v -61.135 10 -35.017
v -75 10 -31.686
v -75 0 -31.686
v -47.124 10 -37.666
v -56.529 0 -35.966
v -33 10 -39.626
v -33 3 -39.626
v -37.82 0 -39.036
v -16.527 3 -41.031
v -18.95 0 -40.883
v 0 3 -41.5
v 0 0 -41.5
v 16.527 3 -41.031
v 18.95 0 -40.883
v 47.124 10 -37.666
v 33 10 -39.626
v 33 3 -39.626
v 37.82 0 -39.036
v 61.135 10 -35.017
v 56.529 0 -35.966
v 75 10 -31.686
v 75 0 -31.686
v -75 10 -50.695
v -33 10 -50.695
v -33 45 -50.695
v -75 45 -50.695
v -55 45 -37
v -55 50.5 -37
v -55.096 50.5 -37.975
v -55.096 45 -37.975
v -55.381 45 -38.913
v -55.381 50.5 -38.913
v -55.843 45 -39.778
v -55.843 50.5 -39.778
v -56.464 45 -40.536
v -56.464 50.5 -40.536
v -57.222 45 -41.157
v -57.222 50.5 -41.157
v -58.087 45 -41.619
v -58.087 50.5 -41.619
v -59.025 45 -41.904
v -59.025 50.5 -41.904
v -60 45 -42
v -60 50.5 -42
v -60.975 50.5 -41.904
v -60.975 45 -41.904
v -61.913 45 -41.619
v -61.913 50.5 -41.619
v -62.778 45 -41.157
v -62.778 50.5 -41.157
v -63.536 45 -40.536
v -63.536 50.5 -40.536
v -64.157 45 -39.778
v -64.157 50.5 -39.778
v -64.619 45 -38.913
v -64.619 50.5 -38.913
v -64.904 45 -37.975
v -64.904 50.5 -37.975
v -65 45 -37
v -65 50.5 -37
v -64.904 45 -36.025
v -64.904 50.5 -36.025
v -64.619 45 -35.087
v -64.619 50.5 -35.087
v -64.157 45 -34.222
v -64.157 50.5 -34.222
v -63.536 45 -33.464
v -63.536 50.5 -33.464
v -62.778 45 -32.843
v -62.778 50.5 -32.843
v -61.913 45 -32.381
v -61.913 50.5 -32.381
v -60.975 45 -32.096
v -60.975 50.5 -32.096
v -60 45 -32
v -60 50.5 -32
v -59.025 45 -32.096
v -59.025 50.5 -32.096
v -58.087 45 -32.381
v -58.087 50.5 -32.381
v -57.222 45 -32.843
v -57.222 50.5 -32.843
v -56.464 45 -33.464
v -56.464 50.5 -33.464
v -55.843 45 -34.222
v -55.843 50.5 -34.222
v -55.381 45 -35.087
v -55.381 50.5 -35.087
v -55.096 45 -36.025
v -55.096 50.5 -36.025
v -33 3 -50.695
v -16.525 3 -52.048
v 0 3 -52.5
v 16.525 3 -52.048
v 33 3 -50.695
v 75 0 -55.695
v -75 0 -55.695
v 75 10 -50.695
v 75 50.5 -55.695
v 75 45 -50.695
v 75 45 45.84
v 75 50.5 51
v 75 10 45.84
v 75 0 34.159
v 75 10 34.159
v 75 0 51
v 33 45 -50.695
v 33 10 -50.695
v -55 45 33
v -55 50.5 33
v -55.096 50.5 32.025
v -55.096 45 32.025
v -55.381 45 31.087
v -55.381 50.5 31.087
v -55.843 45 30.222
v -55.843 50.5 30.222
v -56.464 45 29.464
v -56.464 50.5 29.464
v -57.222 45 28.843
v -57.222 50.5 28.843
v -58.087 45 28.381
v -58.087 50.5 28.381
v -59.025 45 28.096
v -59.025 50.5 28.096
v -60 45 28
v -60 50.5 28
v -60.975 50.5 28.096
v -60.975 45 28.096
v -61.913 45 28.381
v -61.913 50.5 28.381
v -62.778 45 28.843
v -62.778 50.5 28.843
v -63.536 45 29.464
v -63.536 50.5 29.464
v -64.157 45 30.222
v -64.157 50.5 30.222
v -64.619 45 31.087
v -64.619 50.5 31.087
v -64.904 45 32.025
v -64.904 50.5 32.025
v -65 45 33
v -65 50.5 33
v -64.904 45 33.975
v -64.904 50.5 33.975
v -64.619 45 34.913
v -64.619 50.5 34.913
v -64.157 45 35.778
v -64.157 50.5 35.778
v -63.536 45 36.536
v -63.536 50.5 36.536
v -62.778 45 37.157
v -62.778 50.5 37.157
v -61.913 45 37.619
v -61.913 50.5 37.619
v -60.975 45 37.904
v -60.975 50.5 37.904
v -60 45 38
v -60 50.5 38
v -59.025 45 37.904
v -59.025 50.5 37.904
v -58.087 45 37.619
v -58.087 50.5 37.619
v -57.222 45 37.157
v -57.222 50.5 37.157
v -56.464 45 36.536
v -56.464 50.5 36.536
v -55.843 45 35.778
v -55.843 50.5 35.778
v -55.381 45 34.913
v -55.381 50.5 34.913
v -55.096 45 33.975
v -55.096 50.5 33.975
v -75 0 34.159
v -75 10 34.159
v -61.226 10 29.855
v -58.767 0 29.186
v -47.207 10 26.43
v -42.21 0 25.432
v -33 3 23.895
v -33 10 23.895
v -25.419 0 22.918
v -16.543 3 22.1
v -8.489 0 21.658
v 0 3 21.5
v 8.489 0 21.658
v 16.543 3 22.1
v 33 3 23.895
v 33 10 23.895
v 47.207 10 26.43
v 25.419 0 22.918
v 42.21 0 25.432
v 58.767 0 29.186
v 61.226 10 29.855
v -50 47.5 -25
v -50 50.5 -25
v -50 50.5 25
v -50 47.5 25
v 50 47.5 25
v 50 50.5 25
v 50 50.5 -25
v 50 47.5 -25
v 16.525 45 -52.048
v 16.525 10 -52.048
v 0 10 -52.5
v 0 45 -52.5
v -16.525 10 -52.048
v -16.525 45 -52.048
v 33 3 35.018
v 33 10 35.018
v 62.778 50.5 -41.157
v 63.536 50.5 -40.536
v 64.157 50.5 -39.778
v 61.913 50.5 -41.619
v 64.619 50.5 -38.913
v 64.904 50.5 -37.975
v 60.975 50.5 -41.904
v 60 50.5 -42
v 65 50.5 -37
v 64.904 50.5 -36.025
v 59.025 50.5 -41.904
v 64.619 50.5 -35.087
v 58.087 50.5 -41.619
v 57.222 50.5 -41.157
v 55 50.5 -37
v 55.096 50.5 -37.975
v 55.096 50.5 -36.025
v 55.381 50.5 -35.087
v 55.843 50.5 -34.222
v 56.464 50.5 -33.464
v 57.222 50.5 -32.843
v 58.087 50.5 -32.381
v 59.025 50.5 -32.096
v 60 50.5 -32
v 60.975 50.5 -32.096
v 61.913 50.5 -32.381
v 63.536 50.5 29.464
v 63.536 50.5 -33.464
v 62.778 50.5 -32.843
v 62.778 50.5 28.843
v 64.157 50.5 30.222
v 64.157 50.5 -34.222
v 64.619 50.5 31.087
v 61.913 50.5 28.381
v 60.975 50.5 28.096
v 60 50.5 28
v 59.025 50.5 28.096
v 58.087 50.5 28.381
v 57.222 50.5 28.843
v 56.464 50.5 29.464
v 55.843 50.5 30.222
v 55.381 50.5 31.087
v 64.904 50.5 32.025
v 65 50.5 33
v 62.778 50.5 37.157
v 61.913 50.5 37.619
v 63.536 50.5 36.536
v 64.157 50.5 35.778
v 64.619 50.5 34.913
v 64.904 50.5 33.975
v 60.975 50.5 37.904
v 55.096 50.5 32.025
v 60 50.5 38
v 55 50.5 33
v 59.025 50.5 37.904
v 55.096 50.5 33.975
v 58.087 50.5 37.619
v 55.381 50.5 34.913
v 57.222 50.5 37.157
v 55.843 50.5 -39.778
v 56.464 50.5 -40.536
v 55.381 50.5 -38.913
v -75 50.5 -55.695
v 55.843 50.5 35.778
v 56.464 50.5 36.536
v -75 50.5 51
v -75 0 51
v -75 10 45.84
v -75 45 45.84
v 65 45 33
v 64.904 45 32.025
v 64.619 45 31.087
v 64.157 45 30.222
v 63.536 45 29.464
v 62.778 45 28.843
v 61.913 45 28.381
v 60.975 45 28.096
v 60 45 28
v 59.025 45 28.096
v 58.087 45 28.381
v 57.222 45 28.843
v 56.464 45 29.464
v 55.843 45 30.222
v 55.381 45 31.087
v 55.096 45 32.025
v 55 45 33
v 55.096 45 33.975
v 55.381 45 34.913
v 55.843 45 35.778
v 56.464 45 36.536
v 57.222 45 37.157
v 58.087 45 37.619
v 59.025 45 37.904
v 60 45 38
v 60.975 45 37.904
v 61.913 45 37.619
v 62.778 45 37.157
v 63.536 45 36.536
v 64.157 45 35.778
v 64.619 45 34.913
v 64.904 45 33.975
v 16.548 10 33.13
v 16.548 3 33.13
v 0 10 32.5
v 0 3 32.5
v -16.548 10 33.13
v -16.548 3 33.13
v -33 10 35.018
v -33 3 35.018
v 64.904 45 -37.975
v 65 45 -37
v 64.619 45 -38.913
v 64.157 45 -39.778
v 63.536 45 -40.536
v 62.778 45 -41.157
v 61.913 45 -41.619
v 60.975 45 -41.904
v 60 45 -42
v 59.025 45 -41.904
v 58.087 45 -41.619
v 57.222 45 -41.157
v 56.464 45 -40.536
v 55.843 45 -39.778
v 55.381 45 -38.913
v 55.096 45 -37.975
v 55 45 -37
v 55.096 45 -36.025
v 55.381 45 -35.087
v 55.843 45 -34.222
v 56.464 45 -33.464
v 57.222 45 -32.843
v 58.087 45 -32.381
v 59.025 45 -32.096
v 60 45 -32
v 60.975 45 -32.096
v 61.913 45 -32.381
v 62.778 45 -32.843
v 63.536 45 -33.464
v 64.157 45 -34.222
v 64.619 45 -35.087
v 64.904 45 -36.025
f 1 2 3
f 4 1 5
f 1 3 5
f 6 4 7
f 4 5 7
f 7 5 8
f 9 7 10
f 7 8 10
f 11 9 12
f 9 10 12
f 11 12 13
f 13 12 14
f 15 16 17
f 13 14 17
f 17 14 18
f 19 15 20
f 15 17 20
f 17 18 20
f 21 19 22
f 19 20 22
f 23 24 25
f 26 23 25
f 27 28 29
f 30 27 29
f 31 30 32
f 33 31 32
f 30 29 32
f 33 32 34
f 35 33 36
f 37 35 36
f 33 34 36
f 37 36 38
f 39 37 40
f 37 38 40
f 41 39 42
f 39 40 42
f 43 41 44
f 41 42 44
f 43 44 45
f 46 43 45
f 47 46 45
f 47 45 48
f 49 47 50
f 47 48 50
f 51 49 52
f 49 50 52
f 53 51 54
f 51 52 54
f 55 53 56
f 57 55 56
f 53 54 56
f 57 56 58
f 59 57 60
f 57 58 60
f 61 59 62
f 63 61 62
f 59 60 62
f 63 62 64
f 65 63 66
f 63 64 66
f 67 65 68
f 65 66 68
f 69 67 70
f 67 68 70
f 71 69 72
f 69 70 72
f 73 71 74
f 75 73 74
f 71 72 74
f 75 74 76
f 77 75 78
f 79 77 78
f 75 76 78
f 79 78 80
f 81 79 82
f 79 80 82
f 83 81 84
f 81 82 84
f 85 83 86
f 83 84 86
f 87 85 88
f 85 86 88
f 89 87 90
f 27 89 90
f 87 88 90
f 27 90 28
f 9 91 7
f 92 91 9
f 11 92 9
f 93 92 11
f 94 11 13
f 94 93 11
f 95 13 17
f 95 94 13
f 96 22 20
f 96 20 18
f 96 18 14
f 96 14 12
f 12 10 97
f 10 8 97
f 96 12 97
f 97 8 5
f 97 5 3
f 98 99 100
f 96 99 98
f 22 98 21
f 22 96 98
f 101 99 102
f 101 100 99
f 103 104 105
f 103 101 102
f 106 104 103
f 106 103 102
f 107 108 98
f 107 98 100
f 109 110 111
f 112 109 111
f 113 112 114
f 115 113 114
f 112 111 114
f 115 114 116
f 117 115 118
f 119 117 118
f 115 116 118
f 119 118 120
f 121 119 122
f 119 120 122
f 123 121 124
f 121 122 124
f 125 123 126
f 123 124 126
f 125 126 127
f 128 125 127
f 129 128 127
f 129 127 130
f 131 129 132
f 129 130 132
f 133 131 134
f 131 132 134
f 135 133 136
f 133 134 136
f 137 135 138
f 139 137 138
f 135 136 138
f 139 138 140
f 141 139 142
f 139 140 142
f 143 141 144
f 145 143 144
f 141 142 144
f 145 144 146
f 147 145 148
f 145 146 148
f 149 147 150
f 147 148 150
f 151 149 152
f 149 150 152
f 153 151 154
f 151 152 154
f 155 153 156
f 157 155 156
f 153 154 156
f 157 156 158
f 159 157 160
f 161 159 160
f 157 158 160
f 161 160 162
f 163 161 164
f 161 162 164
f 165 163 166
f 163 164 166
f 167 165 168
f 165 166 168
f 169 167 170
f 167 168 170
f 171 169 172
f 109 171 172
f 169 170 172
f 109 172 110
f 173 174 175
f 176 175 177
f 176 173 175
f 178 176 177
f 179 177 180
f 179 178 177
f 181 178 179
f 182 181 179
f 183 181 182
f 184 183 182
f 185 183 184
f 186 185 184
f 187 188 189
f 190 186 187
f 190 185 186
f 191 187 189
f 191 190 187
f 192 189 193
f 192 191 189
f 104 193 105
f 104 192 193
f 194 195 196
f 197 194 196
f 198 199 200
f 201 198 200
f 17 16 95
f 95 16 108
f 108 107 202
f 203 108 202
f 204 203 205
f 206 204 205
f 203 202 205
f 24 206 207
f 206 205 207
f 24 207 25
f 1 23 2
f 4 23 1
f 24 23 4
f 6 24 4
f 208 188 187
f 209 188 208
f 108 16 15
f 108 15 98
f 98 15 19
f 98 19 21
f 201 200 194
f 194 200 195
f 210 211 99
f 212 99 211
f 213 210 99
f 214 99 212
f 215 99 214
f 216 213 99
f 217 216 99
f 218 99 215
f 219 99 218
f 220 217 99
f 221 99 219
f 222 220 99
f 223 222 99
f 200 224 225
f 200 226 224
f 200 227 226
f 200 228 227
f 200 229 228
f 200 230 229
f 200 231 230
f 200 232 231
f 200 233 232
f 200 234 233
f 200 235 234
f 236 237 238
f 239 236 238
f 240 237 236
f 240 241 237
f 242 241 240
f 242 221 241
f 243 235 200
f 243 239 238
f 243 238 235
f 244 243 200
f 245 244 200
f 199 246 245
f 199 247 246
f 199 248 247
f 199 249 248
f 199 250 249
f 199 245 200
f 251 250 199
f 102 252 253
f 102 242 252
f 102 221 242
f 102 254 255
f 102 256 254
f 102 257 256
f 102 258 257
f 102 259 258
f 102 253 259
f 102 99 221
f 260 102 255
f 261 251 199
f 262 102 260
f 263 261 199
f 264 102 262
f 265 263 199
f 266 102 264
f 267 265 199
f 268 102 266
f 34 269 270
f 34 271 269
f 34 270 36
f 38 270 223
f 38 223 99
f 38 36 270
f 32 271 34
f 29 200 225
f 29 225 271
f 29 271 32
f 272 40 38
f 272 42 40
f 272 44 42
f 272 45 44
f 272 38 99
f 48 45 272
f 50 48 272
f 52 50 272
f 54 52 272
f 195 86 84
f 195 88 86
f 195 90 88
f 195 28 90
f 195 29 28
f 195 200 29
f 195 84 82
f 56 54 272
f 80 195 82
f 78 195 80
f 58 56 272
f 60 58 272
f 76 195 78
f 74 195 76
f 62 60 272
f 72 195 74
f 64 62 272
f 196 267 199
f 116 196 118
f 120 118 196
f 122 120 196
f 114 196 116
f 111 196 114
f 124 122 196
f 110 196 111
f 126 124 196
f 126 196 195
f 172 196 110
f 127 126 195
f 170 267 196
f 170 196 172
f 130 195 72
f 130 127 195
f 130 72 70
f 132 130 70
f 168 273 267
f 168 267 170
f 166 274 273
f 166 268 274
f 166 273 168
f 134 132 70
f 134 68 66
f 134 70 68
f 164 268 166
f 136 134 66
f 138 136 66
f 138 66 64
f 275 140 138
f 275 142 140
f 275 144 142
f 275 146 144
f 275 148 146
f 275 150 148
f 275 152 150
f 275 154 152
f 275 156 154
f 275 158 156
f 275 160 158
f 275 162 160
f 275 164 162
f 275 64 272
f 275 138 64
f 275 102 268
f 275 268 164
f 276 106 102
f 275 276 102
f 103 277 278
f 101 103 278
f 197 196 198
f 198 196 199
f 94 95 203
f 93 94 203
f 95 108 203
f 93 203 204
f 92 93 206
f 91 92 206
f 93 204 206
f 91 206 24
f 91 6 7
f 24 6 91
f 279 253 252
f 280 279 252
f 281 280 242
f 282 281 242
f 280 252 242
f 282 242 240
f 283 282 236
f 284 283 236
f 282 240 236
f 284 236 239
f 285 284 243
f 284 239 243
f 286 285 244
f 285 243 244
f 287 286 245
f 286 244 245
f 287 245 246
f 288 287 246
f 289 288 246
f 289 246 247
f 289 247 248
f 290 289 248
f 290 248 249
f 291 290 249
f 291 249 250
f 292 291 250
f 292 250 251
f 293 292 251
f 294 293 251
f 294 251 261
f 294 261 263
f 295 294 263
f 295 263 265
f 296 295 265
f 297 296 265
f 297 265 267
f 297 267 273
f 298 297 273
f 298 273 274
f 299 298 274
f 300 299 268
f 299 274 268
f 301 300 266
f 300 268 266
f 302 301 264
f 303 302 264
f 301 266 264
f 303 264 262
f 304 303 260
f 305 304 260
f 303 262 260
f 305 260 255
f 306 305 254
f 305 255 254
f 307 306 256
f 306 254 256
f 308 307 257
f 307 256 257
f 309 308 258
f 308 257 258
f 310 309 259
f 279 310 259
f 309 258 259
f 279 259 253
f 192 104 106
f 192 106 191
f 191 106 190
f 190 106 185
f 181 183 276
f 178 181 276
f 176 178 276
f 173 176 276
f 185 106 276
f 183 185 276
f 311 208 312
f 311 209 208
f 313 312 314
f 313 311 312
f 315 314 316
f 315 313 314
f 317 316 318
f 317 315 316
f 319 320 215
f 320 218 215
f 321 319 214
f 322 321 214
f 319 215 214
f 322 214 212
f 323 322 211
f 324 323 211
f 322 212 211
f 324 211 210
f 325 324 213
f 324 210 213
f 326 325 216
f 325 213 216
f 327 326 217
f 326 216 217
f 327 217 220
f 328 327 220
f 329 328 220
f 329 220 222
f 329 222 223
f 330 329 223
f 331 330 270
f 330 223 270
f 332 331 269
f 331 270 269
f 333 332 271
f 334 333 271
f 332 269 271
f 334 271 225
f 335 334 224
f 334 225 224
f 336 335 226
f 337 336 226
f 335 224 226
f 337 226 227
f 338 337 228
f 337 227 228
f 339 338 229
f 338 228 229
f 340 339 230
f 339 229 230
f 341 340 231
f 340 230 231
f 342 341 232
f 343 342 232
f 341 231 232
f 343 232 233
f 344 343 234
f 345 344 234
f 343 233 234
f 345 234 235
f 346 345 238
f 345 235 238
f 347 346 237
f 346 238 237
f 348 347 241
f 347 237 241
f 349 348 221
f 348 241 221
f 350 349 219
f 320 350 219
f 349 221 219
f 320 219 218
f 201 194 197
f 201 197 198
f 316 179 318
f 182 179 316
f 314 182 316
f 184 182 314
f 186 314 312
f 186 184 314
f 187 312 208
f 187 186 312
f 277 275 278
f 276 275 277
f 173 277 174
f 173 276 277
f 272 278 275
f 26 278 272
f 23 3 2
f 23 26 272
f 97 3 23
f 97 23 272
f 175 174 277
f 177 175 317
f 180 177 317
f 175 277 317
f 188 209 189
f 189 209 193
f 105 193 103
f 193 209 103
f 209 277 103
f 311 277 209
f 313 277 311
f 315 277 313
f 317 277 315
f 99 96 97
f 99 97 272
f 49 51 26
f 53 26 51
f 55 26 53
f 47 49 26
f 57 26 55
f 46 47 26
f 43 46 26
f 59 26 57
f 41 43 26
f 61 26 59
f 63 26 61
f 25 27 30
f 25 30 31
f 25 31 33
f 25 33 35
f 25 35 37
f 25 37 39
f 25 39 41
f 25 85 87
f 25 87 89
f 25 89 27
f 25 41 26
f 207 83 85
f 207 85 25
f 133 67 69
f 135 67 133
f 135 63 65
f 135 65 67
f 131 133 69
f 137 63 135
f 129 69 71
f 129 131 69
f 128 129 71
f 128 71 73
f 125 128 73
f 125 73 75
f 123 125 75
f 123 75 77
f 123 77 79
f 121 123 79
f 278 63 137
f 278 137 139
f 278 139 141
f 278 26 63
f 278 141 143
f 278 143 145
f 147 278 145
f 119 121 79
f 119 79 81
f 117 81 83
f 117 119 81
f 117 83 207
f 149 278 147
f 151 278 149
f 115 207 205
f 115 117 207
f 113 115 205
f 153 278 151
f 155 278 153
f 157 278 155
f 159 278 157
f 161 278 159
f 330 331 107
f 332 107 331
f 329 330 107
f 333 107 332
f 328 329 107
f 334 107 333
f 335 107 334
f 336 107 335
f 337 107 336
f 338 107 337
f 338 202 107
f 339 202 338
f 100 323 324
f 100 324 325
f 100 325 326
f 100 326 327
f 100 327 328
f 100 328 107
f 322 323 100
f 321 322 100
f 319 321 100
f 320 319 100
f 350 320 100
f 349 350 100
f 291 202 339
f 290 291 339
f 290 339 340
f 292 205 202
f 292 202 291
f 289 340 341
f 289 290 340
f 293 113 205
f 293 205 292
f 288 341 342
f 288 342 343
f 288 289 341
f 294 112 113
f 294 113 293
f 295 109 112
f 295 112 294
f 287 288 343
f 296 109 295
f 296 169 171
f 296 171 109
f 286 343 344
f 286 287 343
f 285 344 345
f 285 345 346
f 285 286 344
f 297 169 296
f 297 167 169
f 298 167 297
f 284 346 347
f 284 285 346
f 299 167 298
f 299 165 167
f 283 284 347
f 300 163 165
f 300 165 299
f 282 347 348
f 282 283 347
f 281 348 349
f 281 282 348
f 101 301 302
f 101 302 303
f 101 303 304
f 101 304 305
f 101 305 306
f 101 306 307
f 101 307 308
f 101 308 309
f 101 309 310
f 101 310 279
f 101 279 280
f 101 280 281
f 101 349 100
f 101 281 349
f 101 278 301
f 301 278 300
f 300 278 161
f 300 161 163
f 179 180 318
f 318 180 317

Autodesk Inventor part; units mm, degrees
ref_plane "YZ Plane" through (0, 0, 0) normal (1, 0, 0) x (0, 1, 0)
ref_plane "XZ Plane" through (0, 0, 0) normal (0, 1, 0) x (-1, 0, 0)
ref_plane "XY Plane" through (0, 0, 0) normal (0, 0, 1) x (1, 0, 0)
sketch "Sketch1" plane through (0, 0, 0) normal (0, 1, 0) x (-1, 0, 0)
  line L0 (75, -60) -> (-75, -60)
  line L1 (-75, -60) -> (-75, 60)
  line L2 (-75, 60) -> (75, 60)
  line L3 (75, 60) -> (75, -60)
  line L4 (75, -60) -> (-75, 60) construction
  line L5 (-75, -60) -> (75, 60) construction
  point P0 (0, 0)
  dimension "d0" = 120
  dimension "d1" = 150
extrude "Extrusion1" add sketch "Sketch1" along normal blind 50.5
sketch "Sketch14" plane through (0, 0, 0) normal (0, 1, 0) x (1, 0, 0)
  line L0 (-75, -60) -> (75, -60) projected
  line L1 (75, -60) -> (75, 60) projected
  line L2 (75, 60) -> (-75, 60) projected
  line L3 (-75, 60) -> (-75, -60) projected
  line L4 (0, 0) -> (0, -250) construction
  circle A0 centre (0, -250) radius 260
  circle A1 centre (0, -250) radius 291.5
  circle A2 centre (0, -250) radius 228.5
  point P0 (75, 31.6864)
  point P1 (-75, 31.6864)
  point P2 (-75, -34.1592)
  point P3 (75, -34.1592)
  dimension "d52" = 250
  dimension "d53" = 520
  dimension "d54" = 583
  dimension "d55" = 457
extrude "Extrusion13" cut sketch "Sketch14" along normal blind 45 contours L3 A0 L1 A2 | L3 A1 L1 A0 picked at (-61.8874, -8.4536) picked at (67.9829, 11.6585)
sketch "Sketch15" plane through (0, 45, 0) normal (0, -1, 0) x (1, 0, 0)
  line L0 (0, 0) -> (0, 250) construction
  circle A0 centre (0, 250) radius 260
  circle A1 centre (0, 250) radius 302.5
  circle A2 centre (0, 250) radius 217.5
  line L1 (-75, 60) -> (75, 60) projected
  line L2 (75, 60) -> (75, -60) projected
  line L3 (75, -60) -> (-75, -60) projected
  line L4 (-75, -60) -> (-75, 60) projected
  point P0 (-75, -43.055)
  point P1 (75, -43.055)
  point P2 (75, 45.8401)
  point P3 (-75, 45.8401)
  dimension "d58" = 250
  dimension "d59" = 520
  dimension "d60" = 605
  dimension "d61" = 435
extrude "Extrusion14" cut sketch "Sketch15" along normal blind 35 contours L4 A2 L2 A0 | A0 L2 A1 L4 picked at (-61.9043, 12.2496) picked at (67.9829, -15.4481)
sketch "Sketch16" plane through (0, 50.5, 0) normal (0, 1, 0) x (1, 0, 0)
  line L0 (0, 0) -> (50, 0) construction
  line L1 (0, 0) -> (-50, 0) construction
  line L2 (-50, 0) -> (-50, -25)
  line L3 (-50, -25) -> (50, -25)
  line L4 (50, -25) -> (50, 0)
  line L5 (50, 0) -> (50, 25)
  line L6 (50, 25) -> (-50, 25)
  line L7 (-50, 25) -> (-50, 0)
  dimension "d64" = 50
  dimension "d65" = 50
  dimension "d66" = 25
  dimension "d67" = 25
extrude "Extrusion15" cut sketch "Sketch16" against normal blind 3
sketch "Sketch17" plane through (0, 10, 0) normal (0, 1, 0) x (1, 0, 0)
  line L0 (0, 0) -> (-33, 0) construction
  line L1 (0, 0) -> (33, 0) construction
  line L2 (33, 0) -> (33, -35.018)
  arc A0 (75, -45.8401) -> (-75, -45.8401) centre (0, -250) ccw projected
  line L3 (33, 0) -> (68.018, 0) construction
  line L4 (-31.2481, 0) -> (6.0348, 0) construction
  line L5 (-33, 0) -> (-33, -35.018)
  line L6 (-33, 0) -> (2.018, 0) construction
  line L7 (-33, 0) -> (-33, 50.6946)
  arc A1 (75, 43.055) -> (-75, 43.055) centre (0, -250) ccw projected
  line L8 (-33, 0) -> (17.6946, 0) construction
  line L9 (33, 0) -> (33, 50.6946)
  line L10 (33, 0) -> (83.6946, 0) construction
  dimension "d70" = 33
  dimension "d71" = 33
  dimension "d72" = 90
  dimension "d74" = 90
  dimension "d75" = 90
  dimension "d76" = 90
extrude "Extrusion16" cut sketch "Sketch17" against normal blind 7
sketch "Sketch18" plane through (75, 0, -60) normal (1, 0, 0) x (0, 0, -1)
  line L0 (-94.1592, 10) -> (-105.8401, 10) projected
  line L1 (-105.8401, 10) -> (-105.8401, 45) projected
  line L2 (-105.8401, 45) -> (-16.945, 45) projected
  line L3 (-16.945, 45) -> (-16.945, 10) projected
  line L4 (-16.945, 10) -> (-28.3136, 10) projected
  line L5 (-28.3136, 10) -> (-28.3136, 0) projected
  line L6 (-28.3136, 0) -> (0, 0) projected
  line L7 (0, 0) -> (0, 50.5) projected
  line L8 (-120, 50.5) -> (0, 50.5) projected
  line L9 (-120, 0) -> (-120, 50.5) projected
  line L10 (-120, 0) -> (-94.1592, 0) projected
  line L11 (-94.1592, 0) -> (-94.1592, 10) projected
  line L12 (-60, 0) -> (-60, 50.5) construction
  line L13 (-94.1592, 10) -> (-28.3136, 10)
  line L14 (-60, 10) -> (-111, 10)
  line L15 (-111, 10) -> (-111, 45)
  line L16 (-16.945, 10) -> (-9.3054, 10) projected
  line L17 (-28.3136, 10) -> (-9.3054, 10)
  line L18 (-9.3054, 10) -> (-9.3054, 3) projected
  line L19 (-9.3054, 10) -> (-9.3054, 45)
  line L20 (-111, 45) -> (-105.8401, 45)
  line L21 (-9.3054, 45) -> (-16.945, 45)
  line L22 (-111, 45) -> (-116, 45)
  line L23 (-116, 45) -> (-116, 10)
  line L24 (-116, 10) -> (-111, 10)
  line L25 (-9.3054, 45) -> (-4.3054, 45)
  line L26 (-4.3054, 45) -> (-4.3054, 10)
  line L27 (-4.3054, 10) -> (-9.3054, 10)
  line L28 (-116, 45) -> (-116, 50.5)
  line L29 (-116, 10) -> (-116, 0)
  line L30 (-94.1592, 0) -> (-120, 0) projected
  line L31 (-4.3054, 45) -> (-4.3054, 50.5)
  line L32 (-4.3054, 10) -> (-4.3054, 0)
  line L33 (-111, 45) -> (-111, 50.5)
  line L34 (-9.3054, 45) -> (-9.3054, 50.5)
  line L35 (-9.3054, 10) -> (-9.3054, 0)
  line L36 (-111, 10) -> (-111, 0)
  point P0 (-9.3054, 3)
  dimension "d79" = 51
  dimension "d81" = 5
  dimension "d82" = 5
extrude "Extrusion17" cut sketch "Sketch18" against normal up to surface (150 mm away) contours L0 L1 L2 L3 L4 L13 | L24 L23 L22 L15 | L36 L10 L29 L24 | L21 L19 L16 L3 | L22 L28 L8 L33 | L29 L10 L9 L8 L28 L23 | L31 L8 L7 L6 L32 L26
sketch "Sketch19" plane through (0, 50.5, 0) normal (0, 1, 0) x (1, 0, 0)
  line L0 (75, 55.6946) -> (-75, 55.6946) projected
  line L1 (-75, 55.6946) -> (-75, -51) projected
  line L2 (-75, -51) -> (75, -51) projected
  line L3 (75, -51) -> (75, 55.6946) projected
  line L4 (50, 25) -> (50, -25) projected
  line L5 (50, -25) -> (-50, -25) projected
  line L6 (-50, -25) -> (-50, 25) projected
  line L7 (-50, 25) -> (50, 25) projected
  line L8 (50, 25) -> (50, -25) construction
  line L9 (50, -25) -> (-50, 25) construction
  line L10 (-50, -25) -> (-50, 25) construction
  line L11 (50, 25) -> (-50, -25) construction
  line L12 (50, -25) -> (-50, -25) construction
  line L13 (50, -25) -> (50, -33) construction
  line L14 (50, -33) -> (60, -33) construction
  line L15 (50, 25) -> (50, 37) construction
  line L16 (50, 37) -> (60, 37) construction
  circle A0 centre (60, -33) radius 5
  circle A1 centre (60, 37) radius 5
  line L17 (0, -51) -> (0, 55.6946) construction
  circle A2 centre (-60, -33) radius 5
  circle A3 centre (-60, 37) radius 5
  dimension "d93" = 8
  dimension "d94" = 10
  dimension "d95" = 12
  dimension "d96" = 10
  dimension "d97" = 90
  dimension "d98" = 10
  dimension "d99" = 10
extrude "Extrusion18" cut sketch "Sketch19" against normal blind 10 contours A0 | A1 | A2 | A3
properties part number "Battery Cage" material "PLA Plastic"
